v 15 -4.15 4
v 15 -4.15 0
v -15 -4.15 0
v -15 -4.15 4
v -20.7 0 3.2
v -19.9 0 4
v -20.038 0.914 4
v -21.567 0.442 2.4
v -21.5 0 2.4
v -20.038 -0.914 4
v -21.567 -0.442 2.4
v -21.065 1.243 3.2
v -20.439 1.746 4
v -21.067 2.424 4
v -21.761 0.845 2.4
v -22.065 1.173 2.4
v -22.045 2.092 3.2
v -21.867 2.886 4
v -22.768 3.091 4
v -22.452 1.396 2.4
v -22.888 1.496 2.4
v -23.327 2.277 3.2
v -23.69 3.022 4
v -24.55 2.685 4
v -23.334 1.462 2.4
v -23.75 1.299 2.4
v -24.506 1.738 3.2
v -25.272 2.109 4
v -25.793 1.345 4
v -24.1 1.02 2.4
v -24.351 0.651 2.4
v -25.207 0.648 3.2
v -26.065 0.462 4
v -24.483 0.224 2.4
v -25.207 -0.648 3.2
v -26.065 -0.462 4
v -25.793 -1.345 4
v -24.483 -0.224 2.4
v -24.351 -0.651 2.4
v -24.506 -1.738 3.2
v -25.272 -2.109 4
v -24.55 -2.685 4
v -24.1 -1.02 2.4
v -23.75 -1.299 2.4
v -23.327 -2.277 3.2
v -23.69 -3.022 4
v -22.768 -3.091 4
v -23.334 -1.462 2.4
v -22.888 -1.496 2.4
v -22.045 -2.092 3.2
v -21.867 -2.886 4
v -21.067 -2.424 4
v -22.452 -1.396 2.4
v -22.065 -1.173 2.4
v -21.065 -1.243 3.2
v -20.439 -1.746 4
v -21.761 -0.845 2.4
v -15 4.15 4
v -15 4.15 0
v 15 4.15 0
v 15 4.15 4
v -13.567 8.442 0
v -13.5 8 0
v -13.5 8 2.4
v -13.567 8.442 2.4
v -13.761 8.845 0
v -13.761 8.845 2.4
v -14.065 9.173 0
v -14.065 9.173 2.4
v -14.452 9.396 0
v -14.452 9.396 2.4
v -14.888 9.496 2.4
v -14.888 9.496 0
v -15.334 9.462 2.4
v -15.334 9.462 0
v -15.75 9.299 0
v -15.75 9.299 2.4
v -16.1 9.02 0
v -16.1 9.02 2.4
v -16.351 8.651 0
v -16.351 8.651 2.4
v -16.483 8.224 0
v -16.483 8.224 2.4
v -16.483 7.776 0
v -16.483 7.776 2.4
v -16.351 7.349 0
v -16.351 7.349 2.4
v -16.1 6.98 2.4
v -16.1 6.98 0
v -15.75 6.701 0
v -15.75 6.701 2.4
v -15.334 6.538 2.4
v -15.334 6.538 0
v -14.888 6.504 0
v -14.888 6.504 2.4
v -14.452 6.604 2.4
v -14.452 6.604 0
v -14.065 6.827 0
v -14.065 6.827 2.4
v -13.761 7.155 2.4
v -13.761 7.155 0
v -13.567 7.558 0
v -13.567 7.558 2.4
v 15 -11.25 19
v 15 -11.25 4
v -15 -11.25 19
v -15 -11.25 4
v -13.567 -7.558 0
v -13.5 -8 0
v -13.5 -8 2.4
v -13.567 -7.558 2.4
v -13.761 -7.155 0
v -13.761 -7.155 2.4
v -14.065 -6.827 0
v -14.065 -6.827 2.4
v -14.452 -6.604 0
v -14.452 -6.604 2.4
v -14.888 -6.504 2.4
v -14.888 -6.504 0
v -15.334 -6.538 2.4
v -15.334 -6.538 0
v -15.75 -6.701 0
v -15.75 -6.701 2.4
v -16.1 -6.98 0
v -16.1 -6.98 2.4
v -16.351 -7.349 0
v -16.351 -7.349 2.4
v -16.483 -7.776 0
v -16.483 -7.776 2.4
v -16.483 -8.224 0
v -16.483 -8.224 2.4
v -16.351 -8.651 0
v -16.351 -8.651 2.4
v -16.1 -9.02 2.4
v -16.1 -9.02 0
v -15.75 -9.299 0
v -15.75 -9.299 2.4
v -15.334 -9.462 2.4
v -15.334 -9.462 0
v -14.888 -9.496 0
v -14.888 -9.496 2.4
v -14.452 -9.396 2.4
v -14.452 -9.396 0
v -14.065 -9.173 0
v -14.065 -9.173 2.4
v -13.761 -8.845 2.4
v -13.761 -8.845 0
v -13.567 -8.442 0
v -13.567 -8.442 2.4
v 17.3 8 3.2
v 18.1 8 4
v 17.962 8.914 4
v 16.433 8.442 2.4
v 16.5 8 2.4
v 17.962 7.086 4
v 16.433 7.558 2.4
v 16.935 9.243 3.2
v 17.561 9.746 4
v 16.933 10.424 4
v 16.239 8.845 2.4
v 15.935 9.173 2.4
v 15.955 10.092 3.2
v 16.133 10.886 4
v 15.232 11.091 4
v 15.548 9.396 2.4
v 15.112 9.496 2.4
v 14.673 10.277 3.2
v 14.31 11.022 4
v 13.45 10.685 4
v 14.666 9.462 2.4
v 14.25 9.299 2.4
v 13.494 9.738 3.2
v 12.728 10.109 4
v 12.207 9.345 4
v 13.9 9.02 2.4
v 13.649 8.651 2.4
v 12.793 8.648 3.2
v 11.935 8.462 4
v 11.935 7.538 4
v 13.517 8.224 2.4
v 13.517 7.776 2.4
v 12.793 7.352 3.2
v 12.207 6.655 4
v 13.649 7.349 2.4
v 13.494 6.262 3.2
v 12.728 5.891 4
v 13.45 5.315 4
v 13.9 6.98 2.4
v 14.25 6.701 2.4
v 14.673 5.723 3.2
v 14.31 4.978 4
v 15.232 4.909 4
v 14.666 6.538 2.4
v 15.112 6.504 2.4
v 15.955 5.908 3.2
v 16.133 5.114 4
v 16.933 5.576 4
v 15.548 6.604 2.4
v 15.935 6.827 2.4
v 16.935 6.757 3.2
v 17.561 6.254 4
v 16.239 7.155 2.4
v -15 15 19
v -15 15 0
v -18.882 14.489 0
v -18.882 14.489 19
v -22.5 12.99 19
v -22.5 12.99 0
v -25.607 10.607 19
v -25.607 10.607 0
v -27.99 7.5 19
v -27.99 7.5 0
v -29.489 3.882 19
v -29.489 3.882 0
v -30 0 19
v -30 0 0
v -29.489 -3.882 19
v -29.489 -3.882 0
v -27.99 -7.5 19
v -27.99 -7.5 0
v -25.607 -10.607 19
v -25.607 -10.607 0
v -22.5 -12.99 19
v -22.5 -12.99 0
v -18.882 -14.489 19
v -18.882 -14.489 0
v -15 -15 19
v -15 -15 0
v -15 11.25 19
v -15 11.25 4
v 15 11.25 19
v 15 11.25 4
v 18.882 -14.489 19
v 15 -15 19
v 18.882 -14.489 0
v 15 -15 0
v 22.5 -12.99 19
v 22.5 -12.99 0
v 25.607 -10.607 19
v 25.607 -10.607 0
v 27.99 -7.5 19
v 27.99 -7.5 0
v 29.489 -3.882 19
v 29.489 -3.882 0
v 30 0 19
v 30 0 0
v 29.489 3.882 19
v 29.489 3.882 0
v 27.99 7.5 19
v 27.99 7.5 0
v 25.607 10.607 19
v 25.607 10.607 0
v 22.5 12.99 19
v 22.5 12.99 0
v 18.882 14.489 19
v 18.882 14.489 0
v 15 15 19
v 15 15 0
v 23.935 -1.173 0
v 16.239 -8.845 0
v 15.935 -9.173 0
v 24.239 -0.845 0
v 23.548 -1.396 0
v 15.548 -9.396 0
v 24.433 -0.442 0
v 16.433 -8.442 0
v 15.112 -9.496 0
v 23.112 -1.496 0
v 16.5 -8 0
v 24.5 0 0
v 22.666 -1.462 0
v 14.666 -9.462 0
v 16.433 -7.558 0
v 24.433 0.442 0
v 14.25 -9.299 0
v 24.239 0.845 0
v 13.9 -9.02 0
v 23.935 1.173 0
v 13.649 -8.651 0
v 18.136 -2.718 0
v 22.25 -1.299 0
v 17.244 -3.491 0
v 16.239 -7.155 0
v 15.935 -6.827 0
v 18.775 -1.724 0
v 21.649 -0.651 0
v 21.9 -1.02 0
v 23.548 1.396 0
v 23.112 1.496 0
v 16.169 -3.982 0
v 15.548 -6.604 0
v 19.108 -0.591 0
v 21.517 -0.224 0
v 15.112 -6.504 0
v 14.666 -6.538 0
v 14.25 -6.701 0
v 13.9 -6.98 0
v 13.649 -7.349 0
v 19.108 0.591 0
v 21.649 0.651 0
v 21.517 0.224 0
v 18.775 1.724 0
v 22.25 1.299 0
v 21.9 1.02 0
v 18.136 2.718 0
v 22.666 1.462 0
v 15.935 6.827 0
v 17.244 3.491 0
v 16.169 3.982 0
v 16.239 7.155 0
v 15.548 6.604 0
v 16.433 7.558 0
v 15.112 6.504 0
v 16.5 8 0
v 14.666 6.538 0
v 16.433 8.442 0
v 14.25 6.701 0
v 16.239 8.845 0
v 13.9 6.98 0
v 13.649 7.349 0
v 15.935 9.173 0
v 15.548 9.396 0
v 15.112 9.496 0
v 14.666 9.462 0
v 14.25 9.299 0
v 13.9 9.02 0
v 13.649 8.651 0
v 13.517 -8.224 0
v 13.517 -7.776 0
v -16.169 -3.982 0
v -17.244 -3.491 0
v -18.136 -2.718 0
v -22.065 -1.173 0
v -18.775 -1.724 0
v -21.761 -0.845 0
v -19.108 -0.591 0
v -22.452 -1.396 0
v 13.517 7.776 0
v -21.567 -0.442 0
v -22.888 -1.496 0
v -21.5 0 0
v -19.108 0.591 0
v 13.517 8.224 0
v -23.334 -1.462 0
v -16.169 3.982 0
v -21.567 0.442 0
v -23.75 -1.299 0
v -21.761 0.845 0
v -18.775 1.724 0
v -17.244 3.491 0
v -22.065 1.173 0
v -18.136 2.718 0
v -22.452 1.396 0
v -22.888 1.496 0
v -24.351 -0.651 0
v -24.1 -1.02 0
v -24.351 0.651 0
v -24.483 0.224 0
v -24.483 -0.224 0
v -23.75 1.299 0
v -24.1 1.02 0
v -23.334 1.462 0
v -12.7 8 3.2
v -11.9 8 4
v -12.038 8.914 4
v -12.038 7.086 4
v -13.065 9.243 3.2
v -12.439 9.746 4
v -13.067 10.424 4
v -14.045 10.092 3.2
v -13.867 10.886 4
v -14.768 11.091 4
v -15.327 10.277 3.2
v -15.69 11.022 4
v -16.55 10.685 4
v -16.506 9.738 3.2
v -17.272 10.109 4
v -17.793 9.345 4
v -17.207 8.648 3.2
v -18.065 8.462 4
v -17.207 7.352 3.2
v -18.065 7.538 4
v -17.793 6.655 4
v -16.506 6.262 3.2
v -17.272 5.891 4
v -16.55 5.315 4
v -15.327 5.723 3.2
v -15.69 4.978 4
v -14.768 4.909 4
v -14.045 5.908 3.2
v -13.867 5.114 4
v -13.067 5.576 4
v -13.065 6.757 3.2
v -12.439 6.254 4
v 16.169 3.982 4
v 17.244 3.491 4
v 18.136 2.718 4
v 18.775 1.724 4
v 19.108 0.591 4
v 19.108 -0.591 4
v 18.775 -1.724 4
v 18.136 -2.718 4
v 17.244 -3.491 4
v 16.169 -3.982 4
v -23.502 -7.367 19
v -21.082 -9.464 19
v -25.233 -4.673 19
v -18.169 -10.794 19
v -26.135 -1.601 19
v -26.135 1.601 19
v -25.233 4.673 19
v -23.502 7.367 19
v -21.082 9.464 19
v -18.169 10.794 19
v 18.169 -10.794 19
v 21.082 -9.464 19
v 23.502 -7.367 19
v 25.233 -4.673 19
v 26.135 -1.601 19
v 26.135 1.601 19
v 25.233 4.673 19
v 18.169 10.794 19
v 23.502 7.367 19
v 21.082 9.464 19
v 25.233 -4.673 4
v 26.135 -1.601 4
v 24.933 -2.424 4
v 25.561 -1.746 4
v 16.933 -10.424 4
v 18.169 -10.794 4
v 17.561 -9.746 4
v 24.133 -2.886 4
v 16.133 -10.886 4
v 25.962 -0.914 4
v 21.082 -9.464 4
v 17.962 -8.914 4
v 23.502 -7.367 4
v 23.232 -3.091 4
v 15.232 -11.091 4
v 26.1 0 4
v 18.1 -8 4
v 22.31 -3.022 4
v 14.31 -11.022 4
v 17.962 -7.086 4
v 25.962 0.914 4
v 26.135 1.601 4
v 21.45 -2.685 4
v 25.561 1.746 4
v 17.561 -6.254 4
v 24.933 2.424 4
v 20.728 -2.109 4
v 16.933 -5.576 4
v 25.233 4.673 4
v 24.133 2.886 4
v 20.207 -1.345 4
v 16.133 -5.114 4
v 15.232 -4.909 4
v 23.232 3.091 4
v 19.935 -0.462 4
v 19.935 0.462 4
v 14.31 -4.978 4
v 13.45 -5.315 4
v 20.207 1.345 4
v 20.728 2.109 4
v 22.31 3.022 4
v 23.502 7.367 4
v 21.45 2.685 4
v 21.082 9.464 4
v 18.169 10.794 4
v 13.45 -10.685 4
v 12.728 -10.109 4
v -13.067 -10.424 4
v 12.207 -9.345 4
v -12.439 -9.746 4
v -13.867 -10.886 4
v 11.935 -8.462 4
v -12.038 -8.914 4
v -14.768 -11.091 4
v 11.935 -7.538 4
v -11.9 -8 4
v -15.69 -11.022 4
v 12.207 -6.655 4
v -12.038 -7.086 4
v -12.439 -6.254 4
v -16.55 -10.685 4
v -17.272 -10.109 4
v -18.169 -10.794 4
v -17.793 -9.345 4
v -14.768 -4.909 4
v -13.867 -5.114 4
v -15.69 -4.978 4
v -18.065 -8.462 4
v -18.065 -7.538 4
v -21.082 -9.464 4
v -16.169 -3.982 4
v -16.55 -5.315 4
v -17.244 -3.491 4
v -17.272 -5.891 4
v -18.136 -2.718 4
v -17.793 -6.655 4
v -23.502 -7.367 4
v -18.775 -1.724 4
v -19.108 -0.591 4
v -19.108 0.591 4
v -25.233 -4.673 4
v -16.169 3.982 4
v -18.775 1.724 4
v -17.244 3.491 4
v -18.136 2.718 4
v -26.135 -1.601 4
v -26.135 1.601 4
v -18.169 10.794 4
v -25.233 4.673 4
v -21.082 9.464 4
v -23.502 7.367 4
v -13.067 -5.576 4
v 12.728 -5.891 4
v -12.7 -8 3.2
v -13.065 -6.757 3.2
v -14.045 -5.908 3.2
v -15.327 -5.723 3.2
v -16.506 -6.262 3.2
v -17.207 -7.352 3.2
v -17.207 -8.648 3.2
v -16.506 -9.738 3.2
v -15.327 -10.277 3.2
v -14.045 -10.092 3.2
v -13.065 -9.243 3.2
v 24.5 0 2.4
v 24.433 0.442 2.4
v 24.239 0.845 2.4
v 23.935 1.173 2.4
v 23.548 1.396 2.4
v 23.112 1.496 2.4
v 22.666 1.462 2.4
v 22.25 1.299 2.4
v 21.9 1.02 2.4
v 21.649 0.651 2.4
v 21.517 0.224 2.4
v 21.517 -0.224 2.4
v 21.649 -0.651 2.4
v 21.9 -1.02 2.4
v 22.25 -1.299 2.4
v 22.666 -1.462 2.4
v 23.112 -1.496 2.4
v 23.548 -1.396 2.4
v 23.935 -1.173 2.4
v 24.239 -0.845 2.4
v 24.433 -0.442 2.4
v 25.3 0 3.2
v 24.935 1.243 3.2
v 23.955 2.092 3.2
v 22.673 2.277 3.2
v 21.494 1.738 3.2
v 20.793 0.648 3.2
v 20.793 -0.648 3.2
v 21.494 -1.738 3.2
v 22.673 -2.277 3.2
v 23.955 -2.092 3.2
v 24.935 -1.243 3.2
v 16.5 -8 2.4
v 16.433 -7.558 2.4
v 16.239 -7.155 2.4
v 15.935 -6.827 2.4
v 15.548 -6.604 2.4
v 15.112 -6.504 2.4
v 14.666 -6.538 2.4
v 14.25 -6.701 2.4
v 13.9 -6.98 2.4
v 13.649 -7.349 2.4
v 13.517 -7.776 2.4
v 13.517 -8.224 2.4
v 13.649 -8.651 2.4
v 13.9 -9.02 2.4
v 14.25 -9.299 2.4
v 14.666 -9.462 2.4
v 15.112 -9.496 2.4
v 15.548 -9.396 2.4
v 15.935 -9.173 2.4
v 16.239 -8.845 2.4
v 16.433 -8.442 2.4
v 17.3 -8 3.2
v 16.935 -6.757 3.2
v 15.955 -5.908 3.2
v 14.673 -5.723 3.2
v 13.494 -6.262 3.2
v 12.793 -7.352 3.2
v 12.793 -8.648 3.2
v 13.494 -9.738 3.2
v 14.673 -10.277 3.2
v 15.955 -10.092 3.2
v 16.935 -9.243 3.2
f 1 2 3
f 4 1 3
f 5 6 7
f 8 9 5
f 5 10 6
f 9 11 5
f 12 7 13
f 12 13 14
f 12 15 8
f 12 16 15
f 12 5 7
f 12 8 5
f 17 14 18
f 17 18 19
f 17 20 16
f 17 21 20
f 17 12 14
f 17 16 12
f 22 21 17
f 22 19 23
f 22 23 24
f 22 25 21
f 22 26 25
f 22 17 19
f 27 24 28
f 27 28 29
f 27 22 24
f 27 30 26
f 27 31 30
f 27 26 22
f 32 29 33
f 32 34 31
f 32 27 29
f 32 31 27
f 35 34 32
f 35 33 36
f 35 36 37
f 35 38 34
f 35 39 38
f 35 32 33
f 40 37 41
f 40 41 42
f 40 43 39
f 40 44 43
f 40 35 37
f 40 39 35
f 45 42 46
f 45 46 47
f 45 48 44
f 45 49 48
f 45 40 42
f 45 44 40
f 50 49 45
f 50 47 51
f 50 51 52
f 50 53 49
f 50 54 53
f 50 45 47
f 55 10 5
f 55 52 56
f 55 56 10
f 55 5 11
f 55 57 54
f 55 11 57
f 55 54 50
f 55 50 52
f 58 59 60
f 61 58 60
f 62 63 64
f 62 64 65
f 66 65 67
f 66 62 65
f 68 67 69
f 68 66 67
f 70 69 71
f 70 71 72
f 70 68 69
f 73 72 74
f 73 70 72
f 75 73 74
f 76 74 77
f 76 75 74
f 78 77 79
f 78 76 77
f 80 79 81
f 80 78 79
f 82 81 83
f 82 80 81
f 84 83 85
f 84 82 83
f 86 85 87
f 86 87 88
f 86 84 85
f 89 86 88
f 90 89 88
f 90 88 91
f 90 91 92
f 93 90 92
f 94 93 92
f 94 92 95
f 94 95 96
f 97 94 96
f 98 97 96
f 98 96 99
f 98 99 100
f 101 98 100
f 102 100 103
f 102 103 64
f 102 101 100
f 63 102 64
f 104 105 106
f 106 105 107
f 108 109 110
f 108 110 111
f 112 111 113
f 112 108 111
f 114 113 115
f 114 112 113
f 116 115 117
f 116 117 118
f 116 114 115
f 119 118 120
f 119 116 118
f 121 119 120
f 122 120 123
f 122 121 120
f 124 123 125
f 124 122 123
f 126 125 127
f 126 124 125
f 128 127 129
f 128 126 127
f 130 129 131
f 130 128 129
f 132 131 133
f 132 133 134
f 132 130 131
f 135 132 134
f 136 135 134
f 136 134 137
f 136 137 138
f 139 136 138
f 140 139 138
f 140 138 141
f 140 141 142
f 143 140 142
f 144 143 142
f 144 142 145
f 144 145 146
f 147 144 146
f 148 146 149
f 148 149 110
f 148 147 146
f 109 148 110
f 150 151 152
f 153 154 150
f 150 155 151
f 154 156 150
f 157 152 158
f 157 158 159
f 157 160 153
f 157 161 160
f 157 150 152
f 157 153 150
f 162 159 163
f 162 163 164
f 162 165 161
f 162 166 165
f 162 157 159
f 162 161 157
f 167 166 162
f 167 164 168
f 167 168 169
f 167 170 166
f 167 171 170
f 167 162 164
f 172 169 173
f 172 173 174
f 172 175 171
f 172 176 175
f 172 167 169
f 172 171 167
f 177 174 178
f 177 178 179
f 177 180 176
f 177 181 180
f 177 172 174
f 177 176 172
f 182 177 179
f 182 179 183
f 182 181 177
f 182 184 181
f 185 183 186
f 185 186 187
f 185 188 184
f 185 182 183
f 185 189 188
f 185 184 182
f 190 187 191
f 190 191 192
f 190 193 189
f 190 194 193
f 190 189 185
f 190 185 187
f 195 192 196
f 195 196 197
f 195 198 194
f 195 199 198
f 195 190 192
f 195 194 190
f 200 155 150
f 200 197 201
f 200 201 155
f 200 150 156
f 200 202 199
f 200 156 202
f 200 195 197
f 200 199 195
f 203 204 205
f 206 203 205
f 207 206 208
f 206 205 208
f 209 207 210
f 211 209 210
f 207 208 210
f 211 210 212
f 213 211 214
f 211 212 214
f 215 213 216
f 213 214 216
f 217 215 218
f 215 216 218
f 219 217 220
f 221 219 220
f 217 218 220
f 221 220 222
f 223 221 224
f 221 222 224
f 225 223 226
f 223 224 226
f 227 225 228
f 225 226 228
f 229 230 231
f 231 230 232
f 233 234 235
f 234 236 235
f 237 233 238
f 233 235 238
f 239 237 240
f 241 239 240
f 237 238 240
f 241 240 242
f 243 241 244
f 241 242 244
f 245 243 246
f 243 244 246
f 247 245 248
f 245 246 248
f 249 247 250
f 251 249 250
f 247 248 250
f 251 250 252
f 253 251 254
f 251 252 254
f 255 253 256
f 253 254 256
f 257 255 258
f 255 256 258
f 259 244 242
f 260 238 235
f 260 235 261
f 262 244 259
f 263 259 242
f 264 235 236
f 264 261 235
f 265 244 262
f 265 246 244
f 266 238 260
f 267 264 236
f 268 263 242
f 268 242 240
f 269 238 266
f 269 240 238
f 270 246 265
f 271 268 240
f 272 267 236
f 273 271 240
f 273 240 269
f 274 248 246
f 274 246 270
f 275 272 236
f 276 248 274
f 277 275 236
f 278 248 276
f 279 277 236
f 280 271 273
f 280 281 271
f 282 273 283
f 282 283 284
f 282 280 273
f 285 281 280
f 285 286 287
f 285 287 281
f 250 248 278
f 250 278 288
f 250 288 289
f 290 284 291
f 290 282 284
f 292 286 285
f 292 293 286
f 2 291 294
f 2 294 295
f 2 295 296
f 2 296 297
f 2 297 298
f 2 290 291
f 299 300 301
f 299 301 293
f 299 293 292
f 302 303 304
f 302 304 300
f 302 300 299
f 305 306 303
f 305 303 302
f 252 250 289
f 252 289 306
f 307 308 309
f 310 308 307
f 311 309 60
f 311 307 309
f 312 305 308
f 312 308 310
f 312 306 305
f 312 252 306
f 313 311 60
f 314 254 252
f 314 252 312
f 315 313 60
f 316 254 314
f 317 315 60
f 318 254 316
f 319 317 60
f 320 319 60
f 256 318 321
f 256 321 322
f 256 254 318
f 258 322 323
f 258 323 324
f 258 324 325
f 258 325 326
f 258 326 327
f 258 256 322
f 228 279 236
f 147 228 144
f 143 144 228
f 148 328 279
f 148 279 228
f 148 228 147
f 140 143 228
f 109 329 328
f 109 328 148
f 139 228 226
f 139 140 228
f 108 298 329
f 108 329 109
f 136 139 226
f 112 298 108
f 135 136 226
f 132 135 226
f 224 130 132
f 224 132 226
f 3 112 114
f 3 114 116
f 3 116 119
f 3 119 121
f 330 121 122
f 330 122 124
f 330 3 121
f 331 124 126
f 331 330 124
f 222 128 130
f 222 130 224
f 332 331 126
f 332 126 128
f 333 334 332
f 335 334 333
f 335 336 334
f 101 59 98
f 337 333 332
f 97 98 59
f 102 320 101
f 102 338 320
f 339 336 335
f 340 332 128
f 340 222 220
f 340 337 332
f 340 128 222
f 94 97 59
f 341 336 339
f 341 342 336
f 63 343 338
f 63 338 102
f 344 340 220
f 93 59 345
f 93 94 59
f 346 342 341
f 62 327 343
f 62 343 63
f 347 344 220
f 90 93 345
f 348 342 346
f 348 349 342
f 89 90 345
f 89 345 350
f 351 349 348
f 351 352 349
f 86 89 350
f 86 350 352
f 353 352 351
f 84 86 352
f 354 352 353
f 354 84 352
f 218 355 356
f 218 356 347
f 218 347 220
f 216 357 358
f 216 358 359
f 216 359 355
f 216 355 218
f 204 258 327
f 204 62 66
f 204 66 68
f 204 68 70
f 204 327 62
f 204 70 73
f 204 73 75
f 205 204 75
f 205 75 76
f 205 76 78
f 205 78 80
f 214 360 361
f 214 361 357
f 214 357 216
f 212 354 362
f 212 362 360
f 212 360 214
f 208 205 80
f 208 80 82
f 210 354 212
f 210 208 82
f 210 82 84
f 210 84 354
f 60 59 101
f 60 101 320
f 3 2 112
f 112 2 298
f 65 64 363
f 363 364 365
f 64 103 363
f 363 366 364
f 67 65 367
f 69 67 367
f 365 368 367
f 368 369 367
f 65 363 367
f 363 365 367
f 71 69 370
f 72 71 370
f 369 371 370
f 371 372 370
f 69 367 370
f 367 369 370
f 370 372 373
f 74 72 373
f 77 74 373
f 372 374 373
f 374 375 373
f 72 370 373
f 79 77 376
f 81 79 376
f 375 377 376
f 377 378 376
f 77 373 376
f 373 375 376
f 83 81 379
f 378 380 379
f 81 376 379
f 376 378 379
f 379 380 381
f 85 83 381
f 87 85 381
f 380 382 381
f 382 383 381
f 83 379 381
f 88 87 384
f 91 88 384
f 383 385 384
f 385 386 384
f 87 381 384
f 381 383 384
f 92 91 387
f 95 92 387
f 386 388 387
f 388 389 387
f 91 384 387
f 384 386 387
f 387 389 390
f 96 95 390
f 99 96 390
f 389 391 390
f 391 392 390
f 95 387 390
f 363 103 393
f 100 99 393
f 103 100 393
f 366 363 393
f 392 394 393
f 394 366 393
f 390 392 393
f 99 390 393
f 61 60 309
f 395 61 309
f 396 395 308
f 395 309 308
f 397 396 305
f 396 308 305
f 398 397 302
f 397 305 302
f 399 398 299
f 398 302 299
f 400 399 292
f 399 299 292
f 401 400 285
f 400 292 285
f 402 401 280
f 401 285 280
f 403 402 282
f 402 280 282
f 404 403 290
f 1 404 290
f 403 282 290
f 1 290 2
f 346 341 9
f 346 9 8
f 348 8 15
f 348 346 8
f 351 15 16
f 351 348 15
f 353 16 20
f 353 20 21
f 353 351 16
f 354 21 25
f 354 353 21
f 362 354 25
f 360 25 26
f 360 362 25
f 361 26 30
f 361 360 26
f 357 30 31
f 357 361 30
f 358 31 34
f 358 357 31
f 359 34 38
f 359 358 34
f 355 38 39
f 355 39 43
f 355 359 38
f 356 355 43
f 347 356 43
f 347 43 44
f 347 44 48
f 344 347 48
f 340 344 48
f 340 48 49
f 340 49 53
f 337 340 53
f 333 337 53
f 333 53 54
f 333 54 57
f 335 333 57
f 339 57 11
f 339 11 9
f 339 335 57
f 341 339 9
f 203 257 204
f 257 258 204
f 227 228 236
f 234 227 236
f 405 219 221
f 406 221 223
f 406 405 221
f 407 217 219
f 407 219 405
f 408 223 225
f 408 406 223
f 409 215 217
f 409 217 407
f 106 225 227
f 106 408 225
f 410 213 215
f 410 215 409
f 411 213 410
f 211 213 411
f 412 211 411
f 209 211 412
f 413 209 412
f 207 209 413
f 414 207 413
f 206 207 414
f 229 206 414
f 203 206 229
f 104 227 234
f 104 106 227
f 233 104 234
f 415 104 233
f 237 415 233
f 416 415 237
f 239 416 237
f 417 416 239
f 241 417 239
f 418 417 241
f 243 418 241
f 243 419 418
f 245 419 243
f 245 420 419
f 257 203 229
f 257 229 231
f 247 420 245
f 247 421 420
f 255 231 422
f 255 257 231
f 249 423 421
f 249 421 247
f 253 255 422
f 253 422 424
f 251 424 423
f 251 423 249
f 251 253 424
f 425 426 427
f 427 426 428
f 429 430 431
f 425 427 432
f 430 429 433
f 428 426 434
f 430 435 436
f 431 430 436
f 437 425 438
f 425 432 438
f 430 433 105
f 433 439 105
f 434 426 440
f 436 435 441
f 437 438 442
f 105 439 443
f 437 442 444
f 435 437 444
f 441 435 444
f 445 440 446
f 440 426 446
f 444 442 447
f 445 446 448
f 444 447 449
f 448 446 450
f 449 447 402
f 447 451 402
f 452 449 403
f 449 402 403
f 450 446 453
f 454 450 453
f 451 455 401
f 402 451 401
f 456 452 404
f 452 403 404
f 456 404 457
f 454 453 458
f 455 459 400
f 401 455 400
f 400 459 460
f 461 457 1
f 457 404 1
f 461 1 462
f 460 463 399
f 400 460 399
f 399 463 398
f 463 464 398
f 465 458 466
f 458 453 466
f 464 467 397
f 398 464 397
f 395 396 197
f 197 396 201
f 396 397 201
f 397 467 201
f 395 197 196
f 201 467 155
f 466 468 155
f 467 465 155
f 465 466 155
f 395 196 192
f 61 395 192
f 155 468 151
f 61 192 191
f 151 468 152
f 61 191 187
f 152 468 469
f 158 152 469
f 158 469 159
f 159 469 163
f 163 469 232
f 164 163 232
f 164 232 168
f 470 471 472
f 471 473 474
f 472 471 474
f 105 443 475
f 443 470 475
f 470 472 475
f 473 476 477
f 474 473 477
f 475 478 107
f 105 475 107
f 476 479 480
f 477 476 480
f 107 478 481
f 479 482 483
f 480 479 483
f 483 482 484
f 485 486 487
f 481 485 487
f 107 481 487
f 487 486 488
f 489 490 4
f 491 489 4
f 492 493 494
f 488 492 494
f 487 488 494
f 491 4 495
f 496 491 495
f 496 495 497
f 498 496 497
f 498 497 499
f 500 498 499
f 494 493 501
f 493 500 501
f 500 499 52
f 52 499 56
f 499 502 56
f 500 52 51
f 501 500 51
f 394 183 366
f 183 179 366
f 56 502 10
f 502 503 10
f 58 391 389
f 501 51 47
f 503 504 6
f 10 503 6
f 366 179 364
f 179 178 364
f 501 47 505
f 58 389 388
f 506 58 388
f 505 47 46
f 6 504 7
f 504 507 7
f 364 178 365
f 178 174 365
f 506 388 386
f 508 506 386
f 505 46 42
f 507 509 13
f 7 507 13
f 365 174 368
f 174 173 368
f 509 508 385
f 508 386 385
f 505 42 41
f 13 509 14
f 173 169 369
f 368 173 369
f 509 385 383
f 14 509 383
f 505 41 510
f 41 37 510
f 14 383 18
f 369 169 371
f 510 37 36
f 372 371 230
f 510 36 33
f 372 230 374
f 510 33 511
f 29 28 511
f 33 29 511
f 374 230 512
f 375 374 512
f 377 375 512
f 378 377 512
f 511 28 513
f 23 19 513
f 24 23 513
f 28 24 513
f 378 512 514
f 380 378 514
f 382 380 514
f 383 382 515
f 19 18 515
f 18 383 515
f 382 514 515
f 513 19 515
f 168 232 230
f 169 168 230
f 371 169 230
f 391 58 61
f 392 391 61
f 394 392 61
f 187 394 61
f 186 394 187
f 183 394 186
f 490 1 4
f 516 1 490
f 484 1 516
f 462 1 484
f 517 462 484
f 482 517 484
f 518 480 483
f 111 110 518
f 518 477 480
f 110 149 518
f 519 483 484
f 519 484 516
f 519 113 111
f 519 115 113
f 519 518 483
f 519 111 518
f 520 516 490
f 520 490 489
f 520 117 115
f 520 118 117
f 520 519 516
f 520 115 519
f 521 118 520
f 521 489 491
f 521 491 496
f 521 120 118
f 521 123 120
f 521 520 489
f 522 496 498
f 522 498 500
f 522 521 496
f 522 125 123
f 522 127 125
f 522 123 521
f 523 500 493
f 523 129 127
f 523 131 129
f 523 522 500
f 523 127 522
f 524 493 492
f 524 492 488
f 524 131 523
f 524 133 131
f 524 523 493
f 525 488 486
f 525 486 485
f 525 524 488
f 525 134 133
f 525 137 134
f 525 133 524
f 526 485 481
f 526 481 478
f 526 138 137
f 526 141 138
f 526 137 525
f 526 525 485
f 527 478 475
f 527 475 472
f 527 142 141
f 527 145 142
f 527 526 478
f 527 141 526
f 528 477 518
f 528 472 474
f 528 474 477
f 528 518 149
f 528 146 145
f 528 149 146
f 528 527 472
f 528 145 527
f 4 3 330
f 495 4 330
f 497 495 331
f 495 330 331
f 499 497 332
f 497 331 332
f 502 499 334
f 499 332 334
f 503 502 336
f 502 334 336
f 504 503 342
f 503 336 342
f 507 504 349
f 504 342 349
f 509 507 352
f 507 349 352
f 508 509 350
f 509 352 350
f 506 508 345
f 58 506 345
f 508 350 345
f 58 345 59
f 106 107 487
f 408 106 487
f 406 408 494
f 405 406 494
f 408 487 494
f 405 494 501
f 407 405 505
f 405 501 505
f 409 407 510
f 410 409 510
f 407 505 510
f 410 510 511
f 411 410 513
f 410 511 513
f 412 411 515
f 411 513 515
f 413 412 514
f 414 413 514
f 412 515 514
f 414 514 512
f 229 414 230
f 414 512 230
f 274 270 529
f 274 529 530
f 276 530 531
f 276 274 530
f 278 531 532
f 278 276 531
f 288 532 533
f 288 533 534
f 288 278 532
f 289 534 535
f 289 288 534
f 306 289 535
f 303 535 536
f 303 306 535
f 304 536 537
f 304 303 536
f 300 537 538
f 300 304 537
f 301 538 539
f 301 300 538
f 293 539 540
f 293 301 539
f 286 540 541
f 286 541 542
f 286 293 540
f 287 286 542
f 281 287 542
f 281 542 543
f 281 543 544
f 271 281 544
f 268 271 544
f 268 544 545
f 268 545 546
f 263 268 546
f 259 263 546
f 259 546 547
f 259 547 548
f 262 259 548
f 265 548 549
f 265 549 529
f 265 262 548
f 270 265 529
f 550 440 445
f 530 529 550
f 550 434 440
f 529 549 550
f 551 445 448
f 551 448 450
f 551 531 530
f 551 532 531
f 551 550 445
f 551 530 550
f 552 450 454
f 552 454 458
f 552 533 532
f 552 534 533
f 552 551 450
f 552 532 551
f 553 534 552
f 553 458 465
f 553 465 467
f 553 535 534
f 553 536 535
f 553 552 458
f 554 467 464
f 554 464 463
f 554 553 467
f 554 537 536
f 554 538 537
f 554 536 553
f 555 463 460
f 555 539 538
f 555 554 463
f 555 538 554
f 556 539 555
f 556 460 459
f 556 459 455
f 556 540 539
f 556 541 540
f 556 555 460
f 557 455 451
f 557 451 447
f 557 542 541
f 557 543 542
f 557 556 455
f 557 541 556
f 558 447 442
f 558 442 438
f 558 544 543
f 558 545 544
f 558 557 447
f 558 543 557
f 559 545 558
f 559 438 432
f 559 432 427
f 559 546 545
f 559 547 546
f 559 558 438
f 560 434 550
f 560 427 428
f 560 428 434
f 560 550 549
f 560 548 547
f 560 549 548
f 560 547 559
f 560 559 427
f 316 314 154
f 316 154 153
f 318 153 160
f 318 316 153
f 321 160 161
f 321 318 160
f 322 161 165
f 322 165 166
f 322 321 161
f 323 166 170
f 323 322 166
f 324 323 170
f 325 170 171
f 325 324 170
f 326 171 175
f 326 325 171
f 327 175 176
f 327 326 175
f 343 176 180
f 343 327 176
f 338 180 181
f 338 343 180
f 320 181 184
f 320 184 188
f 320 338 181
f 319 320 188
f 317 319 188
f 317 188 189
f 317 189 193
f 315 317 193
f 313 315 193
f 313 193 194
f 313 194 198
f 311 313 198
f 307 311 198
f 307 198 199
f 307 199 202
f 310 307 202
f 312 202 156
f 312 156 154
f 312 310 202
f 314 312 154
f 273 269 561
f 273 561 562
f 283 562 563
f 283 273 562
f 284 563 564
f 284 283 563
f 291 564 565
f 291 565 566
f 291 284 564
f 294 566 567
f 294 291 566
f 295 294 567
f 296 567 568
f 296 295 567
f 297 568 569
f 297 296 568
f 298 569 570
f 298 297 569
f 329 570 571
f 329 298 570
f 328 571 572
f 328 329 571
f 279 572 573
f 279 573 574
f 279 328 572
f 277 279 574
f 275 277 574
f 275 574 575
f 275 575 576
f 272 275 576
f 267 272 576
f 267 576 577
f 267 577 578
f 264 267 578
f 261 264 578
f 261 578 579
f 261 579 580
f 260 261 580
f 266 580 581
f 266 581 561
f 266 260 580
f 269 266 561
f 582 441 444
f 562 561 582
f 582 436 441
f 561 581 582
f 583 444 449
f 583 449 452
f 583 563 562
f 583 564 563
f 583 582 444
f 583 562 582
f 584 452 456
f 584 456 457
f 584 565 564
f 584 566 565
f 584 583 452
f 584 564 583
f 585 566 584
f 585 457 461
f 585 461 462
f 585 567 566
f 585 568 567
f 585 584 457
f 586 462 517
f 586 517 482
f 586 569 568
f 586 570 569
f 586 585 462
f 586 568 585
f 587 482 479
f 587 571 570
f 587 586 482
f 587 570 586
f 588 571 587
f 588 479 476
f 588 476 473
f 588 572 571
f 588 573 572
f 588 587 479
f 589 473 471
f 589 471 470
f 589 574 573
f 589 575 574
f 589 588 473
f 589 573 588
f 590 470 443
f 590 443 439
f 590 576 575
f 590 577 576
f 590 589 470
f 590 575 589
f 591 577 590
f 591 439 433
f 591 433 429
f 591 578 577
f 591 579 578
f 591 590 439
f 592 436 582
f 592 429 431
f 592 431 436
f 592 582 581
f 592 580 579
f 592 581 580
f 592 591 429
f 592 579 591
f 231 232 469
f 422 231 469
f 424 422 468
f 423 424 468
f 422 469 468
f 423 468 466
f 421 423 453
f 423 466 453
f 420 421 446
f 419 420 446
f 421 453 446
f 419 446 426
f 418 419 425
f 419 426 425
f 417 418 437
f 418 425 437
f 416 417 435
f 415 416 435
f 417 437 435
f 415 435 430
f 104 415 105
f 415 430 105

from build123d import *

# Parameters (mm, degrees)
SKETCH2_R           = 1.5
BOSS_EXTRUDE1_DEPTH = 4
BOSS_EXTRUDE2_DEPTH = 15
CHAMFER1_SIZE       = 1.6


with BuildPart() as part:
    # Sketch2 → Boss-Extrude1 (new body)
    with BuildSketch(Plane.XY):
        with BuildLine():
            Line((-15, 15), (15, 15))
            ThreePointArc((15, 15), (30, 0), (15, -15))
            Line((15, -15), (-15, -15))
            ThreePointArc((-15, -15), (-30, 0), (-15, 15))
        make_face()
        with Locations((-15, 8)):
            Circle(SKETCH2_R, mode=Mode.SUBTRACT)
        with Locations((-23, 0)):
            Circle(SKETCH2_R, mode=Mode.SUBTRACT)
        with Locations((-15, -8)):
            Circle(SKETCH2_R, mode=Mode.SUBTRACT)
        with Locations((15, -8)):
            Circle(SKETCH2_R, mode=Mode.SUBTRACT)
        with Locations((23, 0)):
            Circle(SKETCH2_R, mode=Mode.SUBTRACT)
        with Locations((15, 8)):
            Circle(SKETCH2_R, mode=Mode.SUBTRACT)
        with BuildLine():
            Line((-15, 4.15), (15, 4.15))
            ThreePointArc((15, 4.15), (19.15, 0), (15, -4.15))
            Line((15, -4.15), (-15, -4.15))
            ThreePointArc((-15, -4.15), (-19.15, 0), (-15, 4.15))
        make_face(mode=Mode.SUBTRACT)
    extrude(amount=BOSS_EXTRUDE1_DEPTH)

    # Sketch3 → Boss-Extrude2 (add)
    with BuildSketch(Plane.XY.offset(4)):
        with BuildLine():
            Line((-15, -15), (15, -15))
            ThreePointArc((15, -15), (30, 0), (15, 15))
            Line((15, 15), (-15, 15))
            ThreePointArc((-15, 15), (-30, 0), (-15, -15))
        make_face()
        with BuildLine():
            Line((-15, 11.25), (15, 11.25))
            ThreePointArc((15, 11.25), (26.25, 0), (15, -11.25))
            Line((15, -11.25), (-15, -11.25))
            ThreePointArc((-15, -11.25), (-26.25, 0), (-15, 11.25))
        make_face(mode=Mode.SUBTRACT)
    extrude(amount=BOSS_EXTRUDE2_DEPTH)

    # Chamfer1
    chamfer1_edges = [part.edges().sort_by_distance(p)[0] for p in [
        (-16.5, 8, 4),
        (-24.5, 0, 4),
        (-16.5, -8, 4),
        (13.5, -8, 4),
        (21.5, 0, 4),
        (13.5, 8, 4),
    ]]
    chamfer(chamfer1_edges, length=CHAMFER1_SIZE)


solid = part.part
